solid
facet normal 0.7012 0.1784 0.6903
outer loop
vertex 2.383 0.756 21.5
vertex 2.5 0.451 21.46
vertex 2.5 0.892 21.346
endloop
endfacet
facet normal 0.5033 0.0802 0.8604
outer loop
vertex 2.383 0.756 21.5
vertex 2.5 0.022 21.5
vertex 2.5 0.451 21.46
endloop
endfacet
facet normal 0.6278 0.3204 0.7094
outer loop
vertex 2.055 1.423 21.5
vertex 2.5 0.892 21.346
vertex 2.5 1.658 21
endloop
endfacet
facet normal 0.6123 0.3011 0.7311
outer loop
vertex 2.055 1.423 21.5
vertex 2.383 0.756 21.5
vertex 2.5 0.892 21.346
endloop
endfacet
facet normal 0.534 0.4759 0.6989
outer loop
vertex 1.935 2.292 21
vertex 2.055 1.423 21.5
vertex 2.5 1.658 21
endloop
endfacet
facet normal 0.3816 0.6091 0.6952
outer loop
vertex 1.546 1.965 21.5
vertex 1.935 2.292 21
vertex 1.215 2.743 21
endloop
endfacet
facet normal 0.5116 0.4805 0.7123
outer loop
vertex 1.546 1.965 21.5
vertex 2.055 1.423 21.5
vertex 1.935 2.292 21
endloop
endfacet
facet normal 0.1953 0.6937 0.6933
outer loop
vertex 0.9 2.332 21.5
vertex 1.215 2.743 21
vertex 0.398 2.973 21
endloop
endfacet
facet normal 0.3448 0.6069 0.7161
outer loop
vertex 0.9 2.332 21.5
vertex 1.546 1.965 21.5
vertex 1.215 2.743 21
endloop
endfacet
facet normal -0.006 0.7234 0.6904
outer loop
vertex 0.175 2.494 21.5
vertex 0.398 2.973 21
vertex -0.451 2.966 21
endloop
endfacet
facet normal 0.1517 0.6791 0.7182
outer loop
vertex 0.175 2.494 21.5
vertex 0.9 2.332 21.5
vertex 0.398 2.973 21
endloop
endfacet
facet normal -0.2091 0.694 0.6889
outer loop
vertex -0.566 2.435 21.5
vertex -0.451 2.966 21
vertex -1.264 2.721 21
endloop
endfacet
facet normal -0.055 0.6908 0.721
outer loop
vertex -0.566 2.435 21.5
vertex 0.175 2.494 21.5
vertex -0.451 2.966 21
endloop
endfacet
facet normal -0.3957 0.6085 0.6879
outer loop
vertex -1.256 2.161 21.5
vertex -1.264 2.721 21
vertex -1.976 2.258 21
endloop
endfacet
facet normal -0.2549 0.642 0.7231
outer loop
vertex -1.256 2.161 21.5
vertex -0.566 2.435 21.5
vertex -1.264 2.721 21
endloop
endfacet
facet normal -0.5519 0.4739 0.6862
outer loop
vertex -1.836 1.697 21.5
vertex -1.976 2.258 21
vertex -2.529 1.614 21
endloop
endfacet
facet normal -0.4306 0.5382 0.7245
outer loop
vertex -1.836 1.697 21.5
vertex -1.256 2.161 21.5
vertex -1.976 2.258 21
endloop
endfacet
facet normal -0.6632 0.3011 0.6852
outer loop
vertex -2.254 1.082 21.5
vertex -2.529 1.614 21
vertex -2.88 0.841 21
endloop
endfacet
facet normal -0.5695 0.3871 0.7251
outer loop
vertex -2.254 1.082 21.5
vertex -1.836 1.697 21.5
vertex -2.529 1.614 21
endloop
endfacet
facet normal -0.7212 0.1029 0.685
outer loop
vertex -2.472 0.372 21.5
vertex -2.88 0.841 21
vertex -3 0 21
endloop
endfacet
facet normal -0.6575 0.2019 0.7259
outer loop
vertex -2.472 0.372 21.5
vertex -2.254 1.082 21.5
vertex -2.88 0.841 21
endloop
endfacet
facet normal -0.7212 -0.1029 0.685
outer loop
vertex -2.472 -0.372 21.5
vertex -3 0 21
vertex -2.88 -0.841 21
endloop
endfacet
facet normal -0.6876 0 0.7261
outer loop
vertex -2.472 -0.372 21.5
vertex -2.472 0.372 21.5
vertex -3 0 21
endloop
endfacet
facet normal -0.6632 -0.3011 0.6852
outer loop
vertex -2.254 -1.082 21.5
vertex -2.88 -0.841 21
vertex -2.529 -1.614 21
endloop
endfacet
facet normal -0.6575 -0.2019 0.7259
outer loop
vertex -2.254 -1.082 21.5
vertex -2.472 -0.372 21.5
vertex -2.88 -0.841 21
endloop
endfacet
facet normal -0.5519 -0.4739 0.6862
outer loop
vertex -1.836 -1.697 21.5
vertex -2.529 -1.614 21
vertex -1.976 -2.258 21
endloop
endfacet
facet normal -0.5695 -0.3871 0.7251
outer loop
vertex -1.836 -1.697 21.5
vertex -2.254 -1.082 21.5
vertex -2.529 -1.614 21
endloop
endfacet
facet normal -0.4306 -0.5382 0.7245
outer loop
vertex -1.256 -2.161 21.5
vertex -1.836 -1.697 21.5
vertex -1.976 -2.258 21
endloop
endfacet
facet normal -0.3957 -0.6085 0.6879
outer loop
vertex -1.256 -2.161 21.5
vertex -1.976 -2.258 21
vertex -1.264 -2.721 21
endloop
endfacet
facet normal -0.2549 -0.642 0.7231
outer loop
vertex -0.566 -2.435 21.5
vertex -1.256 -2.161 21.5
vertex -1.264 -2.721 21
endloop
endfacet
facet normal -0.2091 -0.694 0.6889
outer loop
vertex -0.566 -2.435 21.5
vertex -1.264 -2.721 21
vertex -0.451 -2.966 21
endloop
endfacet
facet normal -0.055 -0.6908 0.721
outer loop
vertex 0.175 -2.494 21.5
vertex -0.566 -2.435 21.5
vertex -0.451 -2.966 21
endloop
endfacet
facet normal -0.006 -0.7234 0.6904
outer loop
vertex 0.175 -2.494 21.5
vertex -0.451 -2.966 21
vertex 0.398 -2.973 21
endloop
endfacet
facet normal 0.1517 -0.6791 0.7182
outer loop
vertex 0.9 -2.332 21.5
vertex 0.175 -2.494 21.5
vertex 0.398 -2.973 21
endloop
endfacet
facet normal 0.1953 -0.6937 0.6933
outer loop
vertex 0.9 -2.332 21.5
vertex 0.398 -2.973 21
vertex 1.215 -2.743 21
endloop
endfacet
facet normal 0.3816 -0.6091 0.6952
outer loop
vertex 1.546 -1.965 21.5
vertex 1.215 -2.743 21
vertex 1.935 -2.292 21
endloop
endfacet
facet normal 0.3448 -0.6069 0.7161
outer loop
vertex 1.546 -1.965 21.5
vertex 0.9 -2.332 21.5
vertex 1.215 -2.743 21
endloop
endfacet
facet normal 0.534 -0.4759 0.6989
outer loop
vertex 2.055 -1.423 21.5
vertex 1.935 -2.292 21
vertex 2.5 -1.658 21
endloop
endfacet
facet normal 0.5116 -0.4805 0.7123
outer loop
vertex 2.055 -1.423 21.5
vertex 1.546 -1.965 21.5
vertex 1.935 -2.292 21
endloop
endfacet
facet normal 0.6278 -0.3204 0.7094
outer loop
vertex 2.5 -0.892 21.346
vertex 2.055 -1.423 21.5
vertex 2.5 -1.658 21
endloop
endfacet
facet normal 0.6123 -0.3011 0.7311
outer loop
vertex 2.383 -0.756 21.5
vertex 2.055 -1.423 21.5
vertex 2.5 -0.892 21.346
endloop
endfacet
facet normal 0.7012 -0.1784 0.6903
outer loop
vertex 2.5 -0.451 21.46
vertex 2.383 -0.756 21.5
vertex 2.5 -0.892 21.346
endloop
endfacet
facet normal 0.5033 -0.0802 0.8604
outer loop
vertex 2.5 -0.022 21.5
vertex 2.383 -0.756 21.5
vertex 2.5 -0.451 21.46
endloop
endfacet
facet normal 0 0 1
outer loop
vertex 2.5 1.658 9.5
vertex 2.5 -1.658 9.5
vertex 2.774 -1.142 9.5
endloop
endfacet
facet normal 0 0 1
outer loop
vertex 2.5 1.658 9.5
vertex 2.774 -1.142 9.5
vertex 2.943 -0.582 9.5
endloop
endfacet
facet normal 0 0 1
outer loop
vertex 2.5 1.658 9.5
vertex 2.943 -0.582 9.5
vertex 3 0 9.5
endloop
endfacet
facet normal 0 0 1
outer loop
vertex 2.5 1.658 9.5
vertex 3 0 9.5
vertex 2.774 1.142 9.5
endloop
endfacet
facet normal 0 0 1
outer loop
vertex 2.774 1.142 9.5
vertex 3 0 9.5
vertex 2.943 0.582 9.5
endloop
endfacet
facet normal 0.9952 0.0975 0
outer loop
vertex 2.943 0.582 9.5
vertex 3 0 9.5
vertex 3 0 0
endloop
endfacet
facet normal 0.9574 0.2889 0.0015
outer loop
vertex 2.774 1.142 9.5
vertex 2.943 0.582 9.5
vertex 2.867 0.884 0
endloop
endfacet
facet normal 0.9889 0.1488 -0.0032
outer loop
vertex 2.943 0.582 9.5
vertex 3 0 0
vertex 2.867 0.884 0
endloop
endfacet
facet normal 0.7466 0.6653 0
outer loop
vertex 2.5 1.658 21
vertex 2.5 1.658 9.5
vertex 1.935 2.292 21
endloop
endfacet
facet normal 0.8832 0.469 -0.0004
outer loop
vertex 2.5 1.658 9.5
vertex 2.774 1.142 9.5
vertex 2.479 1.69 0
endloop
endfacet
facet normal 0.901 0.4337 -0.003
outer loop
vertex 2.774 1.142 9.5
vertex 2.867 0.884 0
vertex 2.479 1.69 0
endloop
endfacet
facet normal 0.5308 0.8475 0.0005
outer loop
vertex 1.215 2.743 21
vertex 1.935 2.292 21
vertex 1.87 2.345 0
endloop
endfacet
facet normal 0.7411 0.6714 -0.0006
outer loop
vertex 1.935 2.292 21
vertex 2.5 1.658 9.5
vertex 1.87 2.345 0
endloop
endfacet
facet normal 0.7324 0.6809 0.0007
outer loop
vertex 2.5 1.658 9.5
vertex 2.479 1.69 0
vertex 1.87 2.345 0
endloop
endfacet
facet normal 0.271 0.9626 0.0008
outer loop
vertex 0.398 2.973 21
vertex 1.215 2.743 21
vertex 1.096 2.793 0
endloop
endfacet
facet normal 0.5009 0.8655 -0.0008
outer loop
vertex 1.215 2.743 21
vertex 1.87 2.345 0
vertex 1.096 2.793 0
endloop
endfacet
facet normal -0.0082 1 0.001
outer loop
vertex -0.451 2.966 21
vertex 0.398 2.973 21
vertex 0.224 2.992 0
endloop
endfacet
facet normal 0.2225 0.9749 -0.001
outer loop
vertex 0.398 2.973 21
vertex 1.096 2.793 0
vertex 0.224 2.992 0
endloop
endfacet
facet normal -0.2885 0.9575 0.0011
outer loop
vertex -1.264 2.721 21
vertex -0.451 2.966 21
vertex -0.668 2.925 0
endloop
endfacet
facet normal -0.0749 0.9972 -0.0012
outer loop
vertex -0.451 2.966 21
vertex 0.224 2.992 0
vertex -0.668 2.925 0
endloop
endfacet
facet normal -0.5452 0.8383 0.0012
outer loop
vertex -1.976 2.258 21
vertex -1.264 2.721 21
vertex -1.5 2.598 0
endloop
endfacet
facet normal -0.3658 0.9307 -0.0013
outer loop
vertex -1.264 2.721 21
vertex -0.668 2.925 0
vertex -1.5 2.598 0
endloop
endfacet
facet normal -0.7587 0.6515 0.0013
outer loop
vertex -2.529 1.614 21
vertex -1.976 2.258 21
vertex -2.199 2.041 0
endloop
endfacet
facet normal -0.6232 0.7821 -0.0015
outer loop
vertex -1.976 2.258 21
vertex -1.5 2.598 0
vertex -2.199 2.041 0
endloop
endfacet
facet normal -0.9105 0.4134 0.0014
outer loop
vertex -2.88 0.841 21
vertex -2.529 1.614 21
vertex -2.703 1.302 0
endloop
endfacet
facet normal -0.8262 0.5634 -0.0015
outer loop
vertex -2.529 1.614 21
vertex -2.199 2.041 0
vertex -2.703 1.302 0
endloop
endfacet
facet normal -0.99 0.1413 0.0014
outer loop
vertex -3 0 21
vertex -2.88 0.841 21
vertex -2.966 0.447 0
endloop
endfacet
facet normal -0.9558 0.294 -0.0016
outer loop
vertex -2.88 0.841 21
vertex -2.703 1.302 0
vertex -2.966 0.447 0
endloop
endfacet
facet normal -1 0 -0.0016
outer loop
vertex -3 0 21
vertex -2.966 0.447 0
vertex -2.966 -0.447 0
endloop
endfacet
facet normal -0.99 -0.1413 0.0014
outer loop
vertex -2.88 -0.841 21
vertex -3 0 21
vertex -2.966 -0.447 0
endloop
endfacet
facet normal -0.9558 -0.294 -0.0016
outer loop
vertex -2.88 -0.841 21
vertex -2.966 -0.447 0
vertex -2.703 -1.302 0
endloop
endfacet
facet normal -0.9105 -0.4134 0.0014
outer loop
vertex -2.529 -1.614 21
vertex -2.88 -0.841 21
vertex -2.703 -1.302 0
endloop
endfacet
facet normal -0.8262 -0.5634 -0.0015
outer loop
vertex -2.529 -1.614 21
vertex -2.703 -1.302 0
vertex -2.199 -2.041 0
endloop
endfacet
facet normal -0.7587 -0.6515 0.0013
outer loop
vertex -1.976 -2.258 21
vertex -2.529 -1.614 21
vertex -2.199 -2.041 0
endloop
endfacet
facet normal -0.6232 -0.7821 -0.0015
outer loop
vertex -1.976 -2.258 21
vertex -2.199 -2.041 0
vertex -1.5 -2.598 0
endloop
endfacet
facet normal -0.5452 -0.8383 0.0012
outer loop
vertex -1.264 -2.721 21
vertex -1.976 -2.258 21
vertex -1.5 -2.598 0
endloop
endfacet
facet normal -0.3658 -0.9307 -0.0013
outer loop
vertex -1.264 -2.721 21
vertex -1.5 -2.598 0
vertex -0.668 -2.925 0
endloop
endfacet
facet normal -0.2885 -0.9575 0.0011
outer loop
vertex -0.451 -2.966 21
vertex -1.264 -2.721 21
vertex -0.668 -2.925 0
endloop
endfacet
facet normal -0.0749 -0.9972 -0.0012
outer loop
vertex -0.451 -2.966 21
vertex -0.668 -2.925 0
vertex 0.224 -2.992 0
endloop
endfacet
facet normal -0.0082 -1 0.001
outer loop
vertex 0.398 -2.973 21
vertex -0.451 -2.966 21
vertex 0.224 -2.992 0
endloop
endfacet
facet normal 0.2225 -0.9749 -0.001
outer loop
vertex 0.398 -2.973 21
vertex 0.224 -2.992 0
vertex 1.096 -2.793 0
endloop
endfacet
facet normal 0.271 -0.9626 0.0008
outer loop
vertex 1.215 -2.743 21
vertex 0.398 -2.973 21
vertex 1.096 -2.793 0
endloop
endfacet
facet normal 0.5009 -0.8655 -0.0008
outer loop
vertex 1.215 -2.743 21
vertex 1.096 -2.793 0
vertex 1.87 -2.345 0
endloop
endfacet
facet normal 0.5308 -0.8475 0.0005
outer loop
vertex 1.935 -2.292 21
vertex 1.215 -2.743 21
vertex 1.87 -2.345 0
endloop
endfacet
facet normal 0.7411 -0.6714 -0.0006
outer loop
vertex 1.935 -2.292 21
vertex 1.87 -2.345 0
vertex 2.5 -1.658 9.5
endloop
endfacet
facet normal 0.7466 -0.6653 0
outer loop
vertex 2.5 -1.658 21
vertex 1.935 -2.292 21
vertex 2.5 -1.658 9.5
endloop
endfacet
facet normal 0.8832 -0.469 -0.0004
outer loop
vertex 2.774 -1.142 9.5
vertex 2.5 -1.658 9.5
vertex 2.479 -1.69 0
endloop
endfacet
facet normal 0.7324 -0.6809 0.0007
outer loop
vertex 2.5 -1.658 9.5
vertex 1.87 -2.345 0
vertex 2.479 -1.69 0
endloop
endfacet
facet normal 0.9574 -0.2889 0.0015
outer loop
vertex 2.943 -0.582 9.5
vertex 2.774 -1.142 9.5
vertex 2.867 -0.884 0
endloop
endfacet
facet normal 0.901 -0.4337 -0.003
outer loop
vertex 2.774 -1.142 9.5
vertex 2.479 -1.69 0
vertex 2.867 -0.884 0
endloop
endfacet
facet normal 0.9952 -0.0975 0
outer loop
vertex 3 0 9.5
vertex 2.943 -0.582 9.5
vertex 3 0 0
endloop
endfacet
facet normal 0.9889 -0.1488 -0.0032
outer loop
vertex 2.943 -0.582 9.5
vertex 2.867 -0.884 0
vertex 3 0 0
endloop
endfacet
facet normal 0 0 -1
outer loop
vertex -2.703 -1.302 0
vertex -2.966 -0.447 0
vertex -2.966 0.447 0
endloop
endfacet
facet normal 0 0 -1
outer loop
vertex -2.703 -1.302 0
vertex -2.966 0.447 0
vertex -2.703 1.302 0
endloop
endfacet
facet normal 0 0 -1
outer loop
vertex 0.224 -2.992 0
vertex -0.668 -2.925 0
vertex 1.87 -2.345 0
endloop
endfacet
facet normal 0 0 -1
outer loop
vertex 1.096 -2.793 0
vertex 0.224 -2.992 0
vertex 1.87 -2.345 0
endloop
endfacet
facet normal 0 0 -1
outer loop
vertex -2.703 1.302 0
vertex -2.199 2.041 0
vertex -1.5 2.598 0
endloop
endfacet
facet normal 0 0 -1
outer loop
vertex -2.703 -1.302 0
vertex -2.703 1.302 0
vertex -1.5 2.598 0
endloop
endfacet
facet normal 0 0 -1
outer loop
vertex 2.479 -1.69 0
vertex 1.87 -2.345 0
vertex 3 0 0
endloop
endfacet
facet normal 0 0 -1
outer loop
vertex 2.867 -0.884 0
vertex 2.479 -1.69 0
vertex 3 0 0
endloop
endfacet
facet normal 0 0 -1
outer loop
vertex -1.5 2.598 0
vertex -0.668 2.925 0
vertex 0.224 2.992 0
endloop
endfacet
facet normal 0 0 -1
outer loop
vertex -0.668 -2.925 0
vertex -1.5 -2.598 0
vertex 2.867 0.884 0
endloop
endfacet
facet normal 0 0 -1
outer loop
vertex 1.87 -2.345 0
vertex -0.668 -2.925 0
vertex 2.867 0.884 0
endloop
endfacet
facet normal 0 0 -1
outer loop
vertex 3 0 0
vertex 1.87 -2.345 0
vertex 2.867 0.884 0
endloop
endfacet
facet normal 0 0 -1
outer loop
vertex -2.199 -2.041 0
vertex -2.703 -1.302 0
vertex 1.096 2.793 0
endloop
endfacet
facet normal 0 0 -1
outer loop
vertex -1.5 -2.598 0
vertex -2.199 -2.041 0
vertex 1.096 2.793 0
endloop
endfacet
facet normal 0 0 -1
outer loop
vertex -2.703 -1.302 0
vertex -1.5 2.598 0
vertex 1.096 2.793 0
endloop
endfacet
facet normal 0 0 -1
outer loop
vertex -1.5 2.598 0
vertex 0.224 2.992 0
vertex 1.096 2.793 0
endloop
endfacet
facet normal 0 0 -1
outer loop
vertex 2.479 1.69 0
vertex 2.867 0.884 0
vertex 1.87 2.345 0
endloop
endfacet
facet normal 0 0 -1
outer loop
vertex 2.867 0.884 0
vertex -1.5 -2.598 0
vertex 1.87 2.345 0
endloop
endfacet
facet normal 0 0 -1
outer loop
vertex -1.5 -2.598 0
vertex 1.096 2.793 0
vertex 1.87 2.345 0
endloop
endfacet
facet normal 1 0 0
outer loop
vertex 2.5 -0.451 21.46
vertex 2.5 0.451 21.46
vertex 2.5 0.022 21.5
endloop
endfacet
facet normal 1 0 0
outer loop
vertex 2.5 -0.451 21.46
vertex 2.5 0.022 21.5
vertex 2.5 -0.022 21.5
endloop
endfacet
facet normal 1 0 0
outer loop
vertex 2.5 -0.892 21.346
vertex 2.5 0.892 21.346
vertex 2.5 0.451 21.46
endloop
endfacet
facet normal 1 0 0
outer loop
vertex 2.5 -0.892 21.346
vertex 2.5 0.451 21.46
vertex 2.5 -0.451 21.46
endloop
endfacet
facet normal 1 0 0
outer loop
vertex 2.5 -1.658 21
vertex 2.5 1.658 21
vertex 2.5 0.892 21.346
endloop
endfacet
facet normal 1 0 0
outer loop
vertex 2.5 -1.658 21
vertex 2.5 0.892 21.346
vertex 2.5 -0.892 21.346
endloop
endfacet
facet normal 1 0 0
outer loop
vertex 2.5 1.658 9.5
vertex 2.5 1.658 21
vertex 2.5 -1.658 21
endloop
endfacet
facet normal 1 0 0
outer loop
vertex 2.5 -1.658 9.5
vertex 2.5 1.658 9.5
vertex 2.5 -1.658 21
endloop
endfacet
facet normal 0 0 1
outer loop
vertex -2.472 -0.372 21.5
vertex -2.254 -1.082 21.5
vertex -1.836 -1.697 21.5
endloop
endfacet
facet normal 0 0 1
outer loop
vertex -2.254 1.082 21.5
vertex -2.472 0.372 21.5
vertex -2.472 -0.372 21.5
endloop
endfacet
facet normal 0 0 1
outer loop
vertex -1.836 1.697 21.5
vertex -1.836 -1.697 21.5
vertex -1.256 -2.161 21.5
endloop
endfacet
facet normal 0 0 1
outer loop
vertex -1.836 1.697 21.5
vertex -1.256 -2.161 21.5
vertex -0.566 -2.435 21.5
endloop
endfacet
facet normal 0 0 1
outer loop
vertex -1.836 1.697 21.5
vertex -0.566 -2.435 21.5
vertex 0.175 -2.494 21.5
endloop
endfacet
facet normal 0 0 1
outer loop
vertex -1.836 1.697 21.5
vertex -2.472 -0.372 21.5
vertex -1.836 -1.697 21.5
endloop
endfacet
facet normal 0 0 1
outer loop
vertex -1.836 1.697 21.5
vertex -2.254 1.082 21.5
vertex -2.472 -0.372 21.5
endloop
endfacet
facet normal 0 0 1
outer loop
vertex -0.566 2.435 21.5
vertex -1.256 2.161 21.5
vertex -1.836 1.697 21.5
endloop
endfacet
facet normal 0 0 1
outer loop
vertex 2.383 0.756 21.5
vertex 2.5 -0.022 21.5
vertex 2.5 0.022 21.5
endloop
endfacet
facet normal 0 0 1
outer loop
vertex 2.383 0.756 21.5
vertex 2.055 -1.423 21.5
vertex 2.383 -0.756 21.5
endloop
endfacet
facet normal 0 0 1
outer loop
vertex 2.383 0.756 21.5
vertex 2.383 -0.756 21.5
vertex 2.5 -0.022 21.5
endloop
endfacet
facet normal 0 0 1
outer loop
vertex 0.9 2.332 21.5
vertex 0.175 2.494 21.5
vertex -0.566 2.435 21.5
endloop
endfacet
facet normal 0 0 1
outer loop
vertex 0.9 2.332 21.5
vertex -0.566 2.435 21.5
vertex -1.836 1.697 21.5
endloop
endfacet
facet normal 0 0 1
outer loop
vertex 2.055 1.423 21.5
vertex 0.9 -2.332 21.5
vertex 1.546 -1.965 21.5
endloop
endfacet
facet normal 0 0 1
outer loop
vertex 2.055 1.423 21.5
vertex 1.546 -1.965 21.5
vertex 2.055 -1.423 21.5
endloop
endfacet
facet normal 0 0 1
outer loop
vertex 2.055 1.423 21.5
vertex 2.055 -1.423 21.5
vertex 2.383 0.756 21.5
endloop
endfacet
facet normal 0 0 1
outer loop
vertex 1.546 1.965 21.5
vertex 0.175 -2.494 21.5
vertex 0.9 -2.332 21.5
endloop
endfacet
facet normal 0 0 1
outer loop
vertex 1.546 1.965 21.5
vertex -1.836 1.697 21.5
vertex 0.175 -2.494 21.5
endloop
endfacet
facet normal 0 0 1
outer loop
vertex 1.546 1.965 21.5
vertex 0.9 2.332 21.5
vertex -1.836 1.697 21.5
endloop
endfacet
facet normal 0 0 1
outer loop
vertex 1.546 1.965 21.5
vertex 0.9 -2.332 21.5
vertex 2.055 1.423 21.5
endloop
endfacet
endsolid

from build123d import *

# Parameters (mm, degrees)
SKETCH1_R           = 3
BOSS_EXTRUDE1_DEPTH = 21.5
CUT_EXTRUDE1_START  = -12
CUT_EXTRUDE1_DEPTH  = 12
CHAMFER1_SIZE       = 0.5


with BuildPart() as part:
    # Sketch1 → Boss-Extrude1 (new body)
    with BuildSketch(Plane.XY):
        Circle(SKETCH1_R)
    extrude(amount=BOSS_EXTRUDE1_DEPTH)

    # Sketch2 → Cut-Extrude1 (cut)
    with BuildSketch(Plane.XY.offset(21.5).offset(CUT_EXTRUDE1_START)):
        with BuildLine():
            Line((2.5, 1.658312395), (2.5, -1.658312395))
            ThreePointArc((2.5, -1.658312395), (3, 0), (2.5, 1.658312395))
        make_face()
    extrude(amount=CUT_EXTRUDE1_DEPTH, mode=Mode.SUBTRACT)

    # Chamfer1
    chamfer1_edges = [part.edges().sort_by_distance(p)[0] for p in [
        (-3, 0, 21.5),
    ]]
    chamfer(chamfer1_edges, length=CHAMFER1_SIZE - 0.0001)  # a hair under: the kernel refuses the full size


solid = part.part
